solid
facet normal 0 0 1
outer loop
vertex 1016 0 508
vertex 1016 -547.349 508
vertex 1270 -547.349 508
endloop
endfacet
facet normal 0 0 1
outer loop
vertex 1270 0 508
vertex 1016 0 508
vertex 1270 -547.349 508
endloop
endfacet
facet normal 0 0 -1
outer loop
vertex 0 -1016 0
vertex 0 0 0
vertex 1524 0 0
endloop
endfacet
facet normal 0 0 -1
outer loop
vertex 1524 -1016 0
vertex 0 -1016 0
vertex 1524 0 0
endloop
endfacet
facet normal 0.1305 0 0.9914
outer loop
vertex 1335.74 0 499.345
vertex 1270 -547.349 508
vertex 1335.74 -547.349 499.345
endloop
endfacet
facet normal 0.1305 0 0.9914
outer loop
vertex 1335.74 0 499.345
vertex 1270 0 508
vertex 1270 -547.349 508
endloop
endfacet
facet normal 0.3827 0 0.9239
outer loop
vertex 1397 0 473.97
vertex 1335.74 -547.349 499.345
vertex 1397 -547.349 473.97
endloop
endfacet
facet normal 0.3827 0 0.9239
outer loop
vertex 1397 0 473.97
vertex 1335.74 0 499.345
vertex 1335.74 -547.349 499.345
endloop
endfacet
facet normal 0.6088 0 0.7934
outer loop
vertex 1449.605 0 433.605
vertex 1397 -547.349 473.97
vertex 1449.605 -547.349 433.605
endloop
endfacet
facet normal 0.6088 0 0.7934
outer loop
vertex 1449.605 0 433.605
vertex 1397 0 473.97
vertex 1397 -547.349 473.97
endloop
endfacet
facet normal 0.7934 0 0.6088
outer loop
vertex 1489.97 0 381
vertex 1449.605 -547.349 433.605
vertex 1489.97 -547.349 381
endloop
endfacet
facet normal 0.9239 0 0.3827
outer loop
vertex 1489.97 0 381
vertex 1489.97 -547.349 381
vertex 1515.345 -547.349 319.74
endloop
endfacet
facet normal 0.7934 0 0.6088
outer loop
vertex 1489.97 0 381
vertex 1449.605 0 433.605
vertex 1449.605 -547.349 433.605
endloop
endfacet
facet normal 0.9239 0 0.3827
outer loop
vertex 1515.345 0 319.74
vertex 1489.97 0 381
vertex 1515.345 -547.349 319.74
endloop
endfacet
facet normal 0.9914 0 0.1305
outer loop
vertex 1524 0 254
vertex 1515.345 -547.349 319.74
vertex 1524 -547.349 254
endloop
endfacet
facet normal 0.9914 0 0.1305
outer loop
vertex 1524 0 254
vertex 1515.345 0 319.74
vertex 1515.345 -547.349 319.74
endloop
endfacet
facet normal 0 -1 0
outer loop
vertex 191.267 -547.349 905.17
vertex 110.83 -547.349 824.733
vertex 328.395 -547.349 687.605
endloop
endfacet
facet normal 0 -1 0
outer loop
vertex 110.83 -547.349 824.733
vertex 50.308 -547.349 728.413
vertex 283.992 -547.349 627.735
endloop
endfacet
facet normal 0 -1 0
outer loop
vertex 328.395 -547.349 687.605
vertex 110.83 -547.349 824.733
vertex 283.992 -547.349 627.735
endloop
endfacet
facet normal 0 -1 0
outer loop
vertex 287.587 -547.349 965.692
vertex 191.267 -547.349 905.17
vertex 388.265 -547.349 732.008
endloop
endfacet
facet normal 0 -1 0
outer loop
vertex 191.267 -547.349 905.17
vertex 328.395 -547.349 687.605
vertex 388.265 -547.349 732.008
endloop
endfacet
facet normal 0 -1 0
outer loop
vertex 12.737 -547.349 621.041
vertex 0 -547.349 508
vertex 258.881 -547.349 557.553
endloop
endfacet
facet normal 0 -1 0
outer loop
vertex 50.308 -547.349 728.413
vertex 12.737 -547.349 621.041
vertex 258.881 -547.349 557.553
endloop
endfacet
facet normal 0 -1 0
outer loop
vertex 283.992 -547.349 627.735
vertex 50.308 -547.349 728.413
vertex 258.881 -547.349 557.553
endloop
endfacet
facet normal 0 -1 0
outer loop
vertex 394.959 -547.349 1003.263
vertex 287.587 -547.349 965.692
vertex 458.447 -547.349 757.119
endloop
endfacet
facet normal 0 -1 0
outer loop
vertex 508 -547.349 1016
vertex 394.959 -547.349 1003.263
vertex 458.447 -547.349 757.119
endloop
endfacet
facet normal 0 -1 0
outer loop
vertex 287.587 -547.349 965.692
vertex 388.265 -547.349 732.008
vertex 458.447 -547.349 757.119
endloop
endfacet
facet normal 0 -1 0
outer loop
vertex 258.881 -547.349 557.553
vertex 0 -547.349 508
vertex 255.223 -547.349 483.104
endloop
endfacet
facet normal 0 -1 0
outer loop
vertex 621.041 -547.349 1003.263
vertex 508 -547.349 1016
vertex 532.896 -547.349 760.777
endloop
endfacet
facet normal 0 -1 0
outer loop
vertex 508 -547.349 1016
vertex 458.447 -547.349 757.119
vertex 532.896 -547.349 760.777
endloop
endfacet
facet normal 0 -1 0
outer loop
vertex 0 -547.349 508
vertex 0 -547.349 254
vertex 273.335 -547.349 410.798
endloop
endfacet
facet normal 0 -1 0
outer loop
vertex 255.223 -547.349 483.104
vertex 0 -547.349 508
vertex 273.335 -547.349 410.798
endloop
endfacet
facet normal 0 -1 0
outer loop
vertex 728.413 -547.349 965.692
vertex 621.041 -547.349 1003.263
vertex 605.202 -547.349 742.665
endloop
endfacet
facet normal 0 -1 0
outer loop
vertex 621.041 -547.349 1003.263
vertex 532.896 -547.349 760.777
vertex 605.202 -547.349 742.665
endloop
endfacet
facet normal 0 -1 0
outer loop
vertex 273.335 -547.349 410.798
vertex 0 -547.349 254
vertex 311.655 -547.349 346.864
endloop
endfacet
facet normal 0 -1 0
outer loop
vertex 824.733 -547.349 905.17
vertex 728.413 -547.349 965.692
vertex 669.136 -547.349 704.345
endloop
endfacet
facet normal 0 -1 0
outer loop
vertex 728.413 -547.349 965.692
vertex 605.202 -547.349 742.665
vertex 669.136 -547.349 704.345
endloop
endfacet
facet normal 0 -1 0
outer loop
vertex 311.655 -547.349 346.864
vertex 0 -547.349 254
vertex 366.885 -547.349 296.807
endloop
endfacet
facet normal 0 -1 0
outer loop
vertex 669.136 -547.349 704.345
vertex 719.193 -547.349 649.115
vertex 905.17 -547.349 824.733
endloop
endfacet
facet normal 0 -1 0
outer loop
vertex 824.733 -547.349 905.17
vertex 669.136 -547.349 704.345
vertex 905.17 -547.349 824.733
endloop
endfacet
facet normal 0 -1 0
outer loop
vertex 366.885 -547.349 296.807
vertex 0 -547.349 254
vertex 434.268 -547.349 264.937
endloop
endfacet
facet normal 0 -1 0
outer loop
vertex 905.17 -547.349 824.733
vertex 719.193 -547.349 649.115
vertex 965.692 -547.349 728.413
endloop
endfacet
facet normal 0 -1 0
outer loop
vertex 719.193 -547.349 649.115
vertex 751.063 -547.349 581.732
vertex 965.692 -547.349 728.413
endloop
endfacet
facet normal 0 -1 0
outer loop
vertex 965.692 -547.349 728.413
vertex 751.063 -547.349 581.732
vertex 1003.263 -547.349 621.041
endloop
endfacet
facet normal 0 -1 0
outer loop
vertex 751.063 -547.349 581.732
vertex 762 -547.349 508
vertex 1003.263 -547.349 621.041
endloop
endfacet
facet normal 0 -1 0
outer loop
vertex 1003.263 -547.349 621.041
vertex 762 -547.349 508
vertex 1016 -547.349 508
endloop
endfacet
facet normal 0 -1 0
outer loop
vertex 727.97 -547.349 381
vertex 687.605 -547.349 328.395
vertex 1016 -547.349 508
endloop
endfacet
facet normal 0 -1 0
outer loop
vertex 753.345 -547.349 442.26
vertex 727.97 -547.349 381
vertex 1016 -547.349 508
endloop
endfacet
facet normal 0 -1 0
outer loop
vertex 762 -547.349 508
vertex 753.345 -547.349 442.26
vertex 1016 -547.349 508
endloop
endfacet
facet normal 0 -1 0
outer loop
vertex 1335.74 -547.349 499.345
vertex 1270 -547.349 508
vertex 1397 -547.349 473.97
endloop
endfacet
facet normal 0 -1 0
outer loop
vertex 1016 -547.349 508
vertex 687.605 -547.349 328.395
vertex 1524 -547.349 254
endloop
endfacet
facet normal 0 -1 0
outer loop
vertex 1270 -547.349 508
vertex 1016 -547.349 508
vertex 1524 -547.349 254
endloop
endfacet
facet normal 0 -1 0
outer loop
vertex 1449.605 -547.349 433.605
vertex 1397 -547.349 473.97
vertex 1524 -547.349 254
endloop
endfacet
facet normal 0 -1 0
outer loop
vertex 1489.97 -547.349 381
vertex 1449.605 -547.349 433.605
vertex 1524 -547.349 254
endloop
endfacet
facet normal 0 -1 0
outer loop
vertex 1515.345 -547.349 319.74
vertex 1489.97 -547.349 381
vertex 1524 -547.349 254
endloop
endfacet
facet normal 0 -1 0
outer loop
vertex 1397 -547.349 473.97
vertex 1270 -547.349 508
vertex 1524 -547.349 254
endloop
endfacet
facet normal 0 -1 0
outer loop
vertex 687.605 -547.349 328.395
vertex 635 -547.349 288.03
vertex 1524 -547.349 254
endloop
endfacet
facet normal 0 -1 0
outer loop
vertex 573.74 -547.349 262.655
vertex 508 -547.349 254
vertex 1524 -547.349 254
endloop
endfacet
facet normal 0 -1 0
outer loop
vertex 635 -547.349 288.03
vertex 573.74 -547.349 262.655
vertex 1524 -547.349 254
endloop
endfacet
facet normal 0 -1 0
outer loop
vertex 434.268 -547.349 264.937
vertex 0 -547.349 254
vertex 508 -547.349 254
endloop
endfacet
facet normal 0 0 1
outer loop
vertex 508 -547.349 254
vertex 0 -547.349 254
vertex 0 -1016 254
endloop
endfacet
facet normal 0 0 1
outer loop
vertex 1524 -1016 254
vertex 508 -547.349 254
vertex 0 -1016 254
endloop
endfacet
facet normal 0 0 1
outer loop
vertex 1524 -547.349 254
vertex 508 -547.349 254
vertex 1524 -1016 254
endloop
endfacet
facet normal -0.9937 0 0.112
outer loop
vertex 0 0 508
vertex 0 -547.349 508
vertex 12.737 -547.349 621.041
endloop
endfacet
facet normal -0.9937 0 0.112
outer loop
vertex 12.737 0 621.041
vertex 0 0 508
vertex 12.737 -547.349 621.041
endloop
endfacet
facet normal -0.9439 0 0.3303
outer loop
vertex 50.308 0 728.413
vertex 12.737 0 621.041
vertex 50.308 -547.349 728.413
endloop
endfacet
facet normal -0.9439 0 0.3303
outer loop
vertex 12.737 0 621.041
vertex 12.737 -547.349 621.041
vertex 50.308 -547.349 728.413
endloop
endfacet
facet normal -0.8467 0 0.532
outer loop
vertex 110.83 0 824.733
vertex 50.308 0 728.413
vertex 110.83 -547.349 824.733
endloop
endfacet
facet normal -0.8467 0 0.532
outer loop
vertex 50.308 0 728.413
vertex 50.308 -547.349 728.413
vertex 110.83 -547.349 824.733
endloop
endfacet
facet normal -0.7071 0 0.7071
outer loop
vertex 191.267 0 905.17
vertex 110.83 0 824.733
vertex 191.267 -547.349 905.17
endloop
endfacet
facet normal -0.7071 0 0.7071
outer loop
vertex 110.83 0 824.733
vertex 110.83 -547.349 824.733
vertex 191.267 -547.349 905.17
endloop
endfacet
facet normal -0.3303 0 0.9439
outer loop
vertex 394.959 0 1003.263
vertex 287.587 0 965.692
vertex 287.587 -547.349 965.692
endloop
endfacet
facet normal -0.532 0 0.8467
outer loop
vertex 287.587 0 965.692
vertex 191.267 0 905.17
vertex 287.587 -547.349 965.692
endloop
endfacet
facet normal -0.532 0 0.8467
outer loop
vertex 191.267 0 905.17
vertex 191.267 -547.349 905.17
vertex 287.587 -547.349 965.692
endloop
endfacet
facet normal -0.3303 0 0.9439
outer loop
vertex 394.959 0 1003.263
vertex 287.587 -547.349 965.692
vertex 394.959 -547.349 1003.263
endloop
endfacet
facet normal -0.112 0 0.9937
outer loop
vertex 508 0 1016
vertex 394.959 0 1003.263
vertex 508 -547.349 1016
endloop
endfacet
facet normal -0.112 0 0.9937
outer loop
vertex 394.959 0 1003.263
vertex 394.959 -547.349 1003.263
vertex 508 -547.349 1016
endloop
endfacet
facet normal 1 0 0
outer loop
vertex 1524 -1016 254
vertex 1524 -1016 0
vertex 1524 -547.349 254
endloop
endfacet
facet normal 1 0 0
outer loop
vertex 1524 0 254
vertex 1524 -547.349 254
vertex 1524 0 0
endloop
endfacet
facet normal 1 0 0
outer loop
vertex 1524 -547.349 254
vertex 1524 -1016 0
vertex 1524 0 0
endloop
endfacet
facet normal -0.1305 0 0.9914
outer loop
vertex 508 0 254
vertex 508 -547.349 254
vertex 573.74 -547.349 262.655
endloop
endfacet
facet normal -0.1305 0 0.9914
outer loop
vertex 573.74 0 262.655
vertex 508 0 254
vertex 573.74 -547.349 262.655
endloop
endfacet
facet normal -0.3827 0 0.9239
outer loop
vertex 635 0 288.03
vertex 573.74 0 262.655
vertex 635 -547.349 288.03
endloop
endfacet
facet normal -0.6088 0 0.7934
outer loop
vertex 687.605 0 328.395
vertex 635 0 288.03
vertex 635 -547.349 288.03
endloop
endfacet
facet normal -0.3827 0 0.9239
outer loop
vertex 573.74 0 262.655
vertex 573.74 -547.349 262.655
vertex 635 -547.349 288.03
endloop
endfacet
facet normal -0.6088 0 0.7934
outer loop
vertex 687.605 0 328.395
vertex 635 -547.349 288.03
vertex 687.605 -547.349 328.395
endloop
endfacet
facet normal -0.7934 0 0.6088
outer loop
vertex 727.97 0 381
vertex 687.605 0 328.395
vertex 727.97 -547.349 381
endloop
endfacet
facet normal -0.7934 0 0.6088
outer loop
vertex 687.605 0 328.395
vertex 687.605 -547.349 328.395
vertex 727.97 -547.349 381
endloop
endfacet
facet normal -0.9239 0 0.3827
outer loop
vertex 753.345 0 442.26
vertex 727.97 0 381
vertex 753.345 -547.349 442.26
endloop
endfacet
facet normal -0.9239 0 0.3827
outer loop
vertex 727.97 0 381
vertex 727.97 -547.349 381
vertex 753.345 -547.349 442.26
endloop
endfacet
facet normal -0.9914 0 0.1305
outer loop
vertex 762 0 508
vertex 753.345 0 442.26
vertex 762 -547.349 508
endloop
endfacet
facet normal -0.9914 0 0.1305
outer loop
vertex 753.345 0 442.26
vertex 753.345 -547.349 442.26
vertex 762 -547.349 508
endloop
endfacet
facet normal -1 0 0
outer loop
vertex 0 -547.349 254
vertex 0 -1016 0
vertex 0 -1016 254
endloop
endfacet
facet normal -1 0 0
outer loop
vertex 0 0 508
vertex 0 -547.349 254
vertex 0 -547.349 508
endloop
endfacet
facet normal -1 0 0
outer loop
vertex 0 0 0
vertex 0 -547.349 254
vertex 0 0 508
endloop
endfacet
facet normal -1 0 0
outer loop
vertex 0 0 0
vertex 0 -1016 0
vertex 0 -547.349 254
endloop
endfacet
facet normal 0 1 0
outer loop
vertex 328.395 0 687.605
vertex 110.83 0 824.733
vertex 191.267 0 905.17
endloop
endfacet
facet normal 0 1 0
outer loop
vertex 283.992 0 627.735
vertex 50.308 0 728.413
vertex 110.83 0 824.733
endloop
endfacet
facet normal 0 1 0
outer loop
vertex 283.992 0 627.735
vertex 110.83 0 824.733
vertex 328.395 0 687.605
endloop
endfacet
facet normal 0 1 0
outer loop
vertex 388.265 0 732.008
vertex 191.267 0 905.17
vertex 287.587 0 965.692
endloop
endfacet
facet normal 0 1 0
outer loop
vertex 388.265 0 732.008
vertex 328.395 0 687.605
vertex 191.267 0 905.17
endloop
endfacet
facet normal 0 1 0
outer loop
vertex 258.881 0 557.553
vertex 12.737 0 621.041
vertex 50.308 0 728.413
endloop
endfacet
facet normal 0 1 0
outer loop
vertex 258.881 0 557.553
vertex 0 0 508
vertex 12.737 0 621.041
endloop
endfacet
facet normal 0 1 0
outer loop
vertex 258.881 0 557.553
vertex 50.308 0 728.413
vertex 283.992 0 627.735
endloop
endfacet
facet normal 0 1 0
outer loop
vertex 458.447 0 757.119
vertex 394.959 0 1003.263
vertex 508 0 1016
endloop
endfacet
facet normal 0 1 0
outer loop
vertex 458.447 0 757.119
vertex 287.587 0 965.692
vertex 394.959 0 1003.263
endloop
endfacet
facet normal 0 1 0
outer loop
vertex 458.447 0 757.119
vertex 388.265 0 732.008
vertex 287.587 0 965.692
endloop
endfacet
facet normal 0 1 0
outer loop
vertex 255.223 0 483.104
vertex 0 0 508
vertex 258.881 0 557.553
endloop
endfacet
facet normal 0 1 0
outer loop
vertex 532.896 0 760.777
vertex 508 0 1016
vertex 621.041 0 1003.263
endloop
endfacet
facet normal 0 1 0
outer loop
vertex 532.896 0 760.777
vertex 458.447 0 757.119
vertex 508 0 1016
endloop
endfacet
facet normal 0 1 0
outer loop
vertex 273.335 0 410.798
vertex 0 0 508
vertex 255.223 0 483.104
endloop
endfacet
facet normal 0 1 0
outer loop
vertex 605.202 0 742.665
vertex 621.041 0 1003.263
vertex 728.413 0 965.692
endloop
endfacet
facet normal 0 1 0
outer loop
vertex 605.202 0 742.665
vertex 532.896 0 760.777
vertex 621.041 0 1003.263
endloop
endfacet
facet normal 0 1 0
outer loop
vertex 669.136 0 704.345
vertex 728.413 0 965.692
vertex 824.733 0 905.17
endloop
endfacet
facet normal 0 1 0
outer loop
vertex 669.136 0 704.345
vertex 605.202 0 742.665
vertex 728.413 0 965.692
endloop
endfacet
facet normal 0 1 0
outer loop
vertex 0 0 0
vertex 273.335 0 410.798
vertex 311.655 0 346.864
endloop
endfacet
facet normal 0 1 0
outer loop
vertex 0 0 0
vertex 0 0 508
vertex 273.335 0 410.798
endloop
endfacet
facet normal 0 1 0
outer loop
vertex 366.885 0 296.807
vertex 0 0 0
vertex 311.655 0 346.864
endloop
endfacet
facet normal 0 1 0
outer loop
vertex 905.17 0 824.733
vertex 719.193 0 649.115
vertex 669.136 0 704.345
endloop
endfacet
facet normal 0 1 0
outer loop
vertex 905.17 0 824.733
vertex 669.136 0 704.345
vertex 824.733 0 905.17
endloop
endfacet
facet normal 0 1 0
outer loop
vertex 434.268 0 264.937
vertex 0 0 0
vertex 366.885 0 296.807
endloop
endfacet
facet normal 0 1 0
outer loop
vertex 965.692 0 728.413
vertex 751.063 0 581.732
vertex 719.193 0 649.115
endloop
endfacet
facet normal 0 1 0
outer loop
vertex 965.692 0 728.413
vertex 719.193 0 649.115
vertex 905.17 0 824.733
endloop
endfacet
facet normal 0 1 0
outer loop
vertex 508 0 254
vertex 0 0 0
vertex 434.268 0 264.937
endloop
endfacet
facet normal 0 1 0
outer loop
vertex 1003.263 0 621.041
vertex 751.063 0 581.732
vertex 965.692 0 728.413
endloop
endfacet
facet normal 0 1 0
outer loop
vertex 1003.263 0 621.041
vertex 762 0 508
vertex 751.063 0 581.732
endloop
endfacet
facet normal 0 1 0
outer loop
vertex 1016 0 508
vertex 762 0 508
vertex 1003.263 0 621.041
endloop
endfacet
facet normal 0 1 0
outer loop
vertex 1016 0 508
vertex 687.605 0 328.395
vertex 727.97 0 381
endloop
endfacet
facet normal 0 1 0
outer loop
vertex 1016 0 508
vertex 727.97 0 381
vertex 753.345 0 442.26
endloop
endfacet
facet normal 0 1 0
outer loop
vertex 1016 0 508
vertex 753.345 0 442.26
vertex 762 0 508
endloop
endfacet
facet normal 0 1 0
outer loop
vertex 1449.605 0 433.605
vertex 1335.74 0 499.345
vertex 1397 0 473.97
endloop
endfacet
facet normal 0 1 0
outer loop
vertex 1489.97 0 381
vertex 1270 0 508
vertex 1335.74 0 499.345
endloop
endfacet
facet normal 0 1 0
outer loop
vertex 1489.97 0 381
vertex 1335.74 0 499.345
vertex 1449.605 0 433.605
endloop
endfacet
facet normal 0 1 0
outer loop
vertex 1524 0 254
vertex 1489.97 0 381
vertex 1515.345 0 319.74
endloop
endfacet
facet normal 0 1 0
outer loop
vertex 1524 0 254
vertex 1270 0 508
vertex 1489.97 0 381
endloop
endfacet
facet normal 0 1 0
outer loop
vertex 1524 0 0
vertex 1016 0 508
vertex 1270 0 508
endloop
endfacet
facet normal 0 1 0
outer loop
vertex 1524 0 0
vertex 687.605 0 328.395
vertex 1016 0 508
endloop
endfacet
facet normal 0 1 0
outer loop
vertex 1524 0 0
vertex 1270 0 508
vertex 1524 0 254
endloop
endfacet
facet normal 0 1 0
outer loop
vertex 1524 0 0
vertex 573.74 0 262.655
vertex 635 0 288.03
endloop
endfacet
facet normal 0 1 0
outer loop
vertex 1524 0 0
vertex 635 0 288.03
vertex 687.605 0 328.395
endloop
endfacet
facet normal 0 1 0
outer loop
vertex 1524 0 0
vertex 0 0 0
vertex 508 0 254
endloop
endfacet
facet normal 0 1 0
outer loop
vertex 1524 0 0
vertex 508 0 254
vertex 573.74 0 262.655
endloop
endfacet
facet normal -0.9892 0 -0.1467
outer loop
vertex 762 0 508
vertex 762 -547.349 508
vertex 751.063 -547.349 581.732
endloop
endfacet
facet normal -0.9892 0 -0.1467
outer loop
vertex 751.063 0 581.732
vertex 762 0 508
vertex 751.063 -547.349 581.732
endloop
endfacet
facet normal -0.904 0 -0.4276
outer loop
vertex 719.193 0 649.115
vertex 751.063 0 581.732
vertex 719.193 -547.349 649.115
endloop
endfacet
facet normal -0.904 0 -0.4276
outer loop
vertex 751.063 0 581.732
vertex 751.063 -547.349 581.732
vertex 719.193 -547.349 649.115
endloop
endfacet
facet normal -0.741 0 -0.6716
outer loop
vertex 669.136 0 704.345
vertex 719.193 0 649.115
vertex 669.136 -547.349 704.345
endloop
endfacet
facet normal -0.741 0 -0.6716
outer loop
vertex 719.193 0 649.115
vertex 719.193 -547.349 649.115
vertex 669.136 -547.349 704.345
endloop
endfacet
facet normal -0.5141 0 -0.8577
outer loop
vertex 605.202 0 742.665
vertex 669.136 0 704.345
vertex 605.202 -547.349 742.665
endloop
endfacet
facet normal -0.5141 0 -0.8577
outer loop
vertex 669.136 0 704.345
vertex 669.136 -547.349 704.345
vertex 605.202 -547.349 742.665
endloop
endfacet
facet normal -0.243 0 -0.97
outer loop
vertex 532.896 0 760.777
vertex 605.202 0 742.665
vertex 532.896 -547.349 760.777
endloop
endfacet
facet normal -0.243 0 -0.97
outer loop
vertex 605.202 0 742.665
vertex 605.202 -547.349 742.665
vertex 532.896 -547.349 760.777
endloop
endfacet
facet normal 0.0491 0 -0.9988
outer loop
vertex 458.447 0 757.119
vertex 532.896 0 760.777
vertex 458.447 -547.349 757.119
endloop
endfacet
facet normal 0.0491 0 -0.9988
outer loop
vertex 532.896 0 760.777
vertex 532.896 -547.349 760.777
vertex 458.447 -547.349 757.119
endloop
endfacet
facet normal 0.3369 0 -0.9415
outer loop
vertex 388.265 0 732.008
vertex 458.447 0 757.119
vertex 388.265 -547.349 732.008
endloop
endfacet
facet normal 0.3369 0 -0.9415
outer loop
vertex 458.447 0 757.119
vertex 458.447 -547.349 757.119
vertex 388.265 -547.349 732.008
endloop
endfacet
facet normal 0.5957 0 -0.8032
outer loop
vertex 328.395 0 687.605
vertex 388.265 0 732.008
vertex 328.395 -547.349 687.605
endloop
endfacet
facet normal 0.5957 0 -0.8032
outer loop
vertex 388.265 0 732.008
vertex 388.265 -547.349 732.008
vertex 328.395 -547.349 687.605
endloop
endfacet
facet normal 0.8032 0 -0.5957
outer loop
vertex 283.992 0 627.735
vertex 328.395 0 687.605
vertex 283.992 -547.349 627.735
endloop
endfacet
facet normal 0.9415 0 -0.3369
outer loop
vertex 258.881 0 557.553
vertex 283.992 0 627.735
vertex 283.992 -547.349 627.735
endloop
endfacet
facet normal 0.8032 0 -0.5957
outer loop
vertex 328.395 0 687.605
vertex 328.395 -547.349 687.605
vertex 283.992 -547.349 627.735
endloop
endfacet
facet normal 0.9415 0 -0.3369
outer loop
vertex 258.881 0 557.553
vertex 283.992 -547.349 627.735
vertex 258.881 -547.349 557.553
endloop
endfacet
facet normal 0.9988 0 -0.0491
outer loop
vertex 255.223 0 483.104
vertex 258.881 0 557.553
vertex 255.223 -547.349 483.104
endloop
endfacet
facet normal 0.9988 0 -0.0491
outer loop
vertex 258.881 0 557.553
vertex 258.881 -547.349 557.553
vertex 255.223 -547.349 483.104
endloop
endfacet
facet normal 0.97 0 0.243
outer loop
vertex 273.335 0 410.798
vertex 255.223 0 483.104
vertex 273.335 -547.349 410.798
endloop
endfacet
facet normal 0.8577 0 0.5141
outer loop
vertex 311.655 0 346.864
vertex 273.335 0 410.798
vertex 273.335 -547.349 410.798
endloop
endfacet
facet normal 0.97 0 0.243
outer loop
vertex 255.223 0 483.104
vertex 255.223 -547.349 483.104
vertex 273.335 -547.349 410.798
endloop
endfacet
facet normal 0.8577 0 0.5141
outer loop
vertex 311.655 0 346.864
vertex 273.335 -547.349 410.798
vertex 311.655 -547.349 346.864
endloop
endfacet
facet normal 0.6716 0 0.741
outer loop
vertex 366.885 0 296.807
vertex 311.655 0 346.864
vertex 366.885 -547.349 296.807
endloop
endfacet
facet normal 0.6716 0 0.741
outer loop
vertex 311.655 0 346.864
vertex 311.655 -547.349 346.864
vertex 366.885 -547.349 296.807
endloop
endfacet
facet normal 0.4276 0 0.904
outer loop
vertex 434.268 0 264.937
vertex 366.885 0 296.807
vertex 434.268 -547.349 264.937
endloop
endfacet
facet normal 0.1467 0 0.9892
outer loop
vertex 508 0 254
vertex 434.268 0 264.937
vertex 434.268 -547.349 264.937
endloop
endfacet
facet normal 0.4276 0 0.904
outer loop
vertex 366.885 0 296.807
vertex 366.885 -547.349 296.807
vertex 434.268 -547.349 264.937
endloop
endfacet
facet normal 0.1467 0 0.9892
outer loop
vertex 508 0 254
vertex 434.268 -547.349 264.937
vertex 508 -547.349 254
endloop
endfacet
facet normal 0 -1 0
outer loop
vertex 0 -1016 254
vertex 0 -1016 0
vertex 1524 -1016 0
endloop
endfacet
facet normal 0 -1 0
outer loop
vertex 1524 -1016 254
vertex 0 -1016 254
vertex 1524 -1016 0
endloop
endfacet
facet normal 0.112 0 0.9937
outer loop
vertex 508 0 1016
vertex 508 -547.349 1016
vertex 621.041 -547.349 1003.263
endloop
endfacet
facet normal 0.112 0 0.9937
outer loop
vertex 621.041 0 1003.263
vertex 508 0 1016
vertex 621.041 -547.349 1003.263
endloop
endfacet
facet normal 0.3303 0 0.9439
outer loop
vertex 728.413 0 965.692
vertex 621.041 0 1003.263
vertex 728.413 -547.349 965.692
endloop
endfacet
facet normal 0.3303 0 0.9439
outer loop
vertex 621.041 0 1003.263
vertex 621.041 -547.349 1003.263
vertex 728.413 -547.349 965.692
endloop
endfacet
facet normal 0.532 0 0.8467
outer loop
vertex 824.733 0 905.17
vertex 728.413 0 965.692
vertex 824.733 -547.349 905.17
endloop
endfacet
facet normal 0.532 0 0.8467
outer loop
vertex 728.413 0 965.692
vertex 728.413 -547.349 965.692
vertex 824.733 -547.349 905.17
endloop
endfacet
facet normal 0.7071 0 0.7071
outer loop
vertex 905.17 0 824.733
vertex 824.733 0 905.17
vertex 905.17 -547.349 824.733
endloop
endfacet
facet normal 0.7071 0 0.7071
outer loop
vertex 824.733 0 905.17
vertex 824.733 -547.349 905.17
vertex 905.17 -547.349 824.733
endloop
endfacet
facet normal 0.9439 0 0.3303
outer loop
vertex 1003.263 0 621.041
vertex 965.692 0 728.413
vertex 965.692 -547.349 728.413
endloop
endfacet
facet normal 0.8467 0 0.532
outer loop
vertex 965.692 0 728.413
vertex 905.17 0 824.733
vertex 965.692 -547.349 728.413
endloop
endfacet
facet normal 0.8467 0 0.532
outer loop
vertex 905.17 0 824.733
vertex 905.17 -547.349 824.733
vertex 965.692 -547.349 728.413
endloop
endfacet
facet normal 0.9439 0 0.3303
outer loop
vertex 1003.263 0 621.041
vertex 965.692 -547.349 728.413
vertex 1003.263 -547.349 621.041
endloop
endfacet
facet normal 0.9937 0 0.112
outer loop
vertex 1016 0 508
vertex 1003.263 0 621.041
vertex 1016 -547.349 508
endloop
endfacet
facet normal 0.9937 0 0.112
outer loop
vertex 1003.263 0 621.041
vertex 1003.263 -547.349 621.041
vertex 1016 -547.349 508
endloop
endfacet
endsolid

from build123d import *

# Parameters (mm, degrees)
F0_W      = 1524
F0_H      = 1016
F1_DEPTH  = 508
F2_W      = 1524
F2_H      = 468.650964
F3_DEPTH  = 254
F4_R      = 254
F1_FACE_W = 1270
F1_FACE_H = 547.349036
F5_DEPTH  = 508
F7_DEPTH  = 1143
F9_DEPTH  = 1143


with BuildPart() as f1:
    # F0 (on Top) → F1 (new body)
    with BuildSketch(Plane.XY):
        with Locations((762, -508)):
            Rectangle(F0_W, F0_H)
    extrude(amount=F1_DEPTH)

    # F2 (on face) → F3 (cut)
    with BuildSketch(Plane.XY.offset(508)):
        with Locations((762, -781.674518)):
            Rectangle(F2_W, F2_H)
    extrude(amount=-F3_DEPTH, mode=Mode.SUBTRACT)

    # F4
    f4_edges = [f1.edges().sort_by_distance(p)[0] for p in [
        (1524, -273.674518, 508),
    ]]
    fillet(f4_edges, radius=F4_R)

    # F1_face (on face) → F5 (join)
    with BuildSketch(Plane(origin=(762, -508, 508), x_dir=(1, 0, 0), z_dir=(0, 0, 1))):
        with Locations((-127, 234.325482)):
            Rectangle(F1_FACE_W, F1_FACE_H)
    extrude(amount=F5_DEPTH)

    # F6 (on face) → F7 (cut)
    with BuildSketch(Plane.XZ.offset(547.349036)):
        with BuildLine():
            Line((0, 1016), (0, 508))
            ThreePointArc((0, 508), (148.789755, 867.210245), (508, 1016))
            Line((508, 1016), (0, 1016))
        make_face()
        with BuildLine():
            ThreePointArc((508, 1016), (867.210245, 867.210245), (1016, 508))
            Line((1016, 508), (1270, 508))
            Line((1270, 508), (1270, 1016))
            Line((1270, 1016), (508, 1016))
        make_face()
    extrude(amount=-F7_DEPTH, mode=Mode.SUBTRACT)

    # F8 (on face) → F9 (cut)
    with BuildSketch(Plane.XZ.offset(547.349036)):
        with BuildLine():
            ThreePointArc((508, 254), (687.605122, 328.394878), (762, 508))
            ThreePointArc((762, 508), (328.394878, 687.605122), (508, 254))
        make_face()
    extrude(amount=-F9_DEPTH, mode=Mode.SUBTRACT)


solid = f1.part
